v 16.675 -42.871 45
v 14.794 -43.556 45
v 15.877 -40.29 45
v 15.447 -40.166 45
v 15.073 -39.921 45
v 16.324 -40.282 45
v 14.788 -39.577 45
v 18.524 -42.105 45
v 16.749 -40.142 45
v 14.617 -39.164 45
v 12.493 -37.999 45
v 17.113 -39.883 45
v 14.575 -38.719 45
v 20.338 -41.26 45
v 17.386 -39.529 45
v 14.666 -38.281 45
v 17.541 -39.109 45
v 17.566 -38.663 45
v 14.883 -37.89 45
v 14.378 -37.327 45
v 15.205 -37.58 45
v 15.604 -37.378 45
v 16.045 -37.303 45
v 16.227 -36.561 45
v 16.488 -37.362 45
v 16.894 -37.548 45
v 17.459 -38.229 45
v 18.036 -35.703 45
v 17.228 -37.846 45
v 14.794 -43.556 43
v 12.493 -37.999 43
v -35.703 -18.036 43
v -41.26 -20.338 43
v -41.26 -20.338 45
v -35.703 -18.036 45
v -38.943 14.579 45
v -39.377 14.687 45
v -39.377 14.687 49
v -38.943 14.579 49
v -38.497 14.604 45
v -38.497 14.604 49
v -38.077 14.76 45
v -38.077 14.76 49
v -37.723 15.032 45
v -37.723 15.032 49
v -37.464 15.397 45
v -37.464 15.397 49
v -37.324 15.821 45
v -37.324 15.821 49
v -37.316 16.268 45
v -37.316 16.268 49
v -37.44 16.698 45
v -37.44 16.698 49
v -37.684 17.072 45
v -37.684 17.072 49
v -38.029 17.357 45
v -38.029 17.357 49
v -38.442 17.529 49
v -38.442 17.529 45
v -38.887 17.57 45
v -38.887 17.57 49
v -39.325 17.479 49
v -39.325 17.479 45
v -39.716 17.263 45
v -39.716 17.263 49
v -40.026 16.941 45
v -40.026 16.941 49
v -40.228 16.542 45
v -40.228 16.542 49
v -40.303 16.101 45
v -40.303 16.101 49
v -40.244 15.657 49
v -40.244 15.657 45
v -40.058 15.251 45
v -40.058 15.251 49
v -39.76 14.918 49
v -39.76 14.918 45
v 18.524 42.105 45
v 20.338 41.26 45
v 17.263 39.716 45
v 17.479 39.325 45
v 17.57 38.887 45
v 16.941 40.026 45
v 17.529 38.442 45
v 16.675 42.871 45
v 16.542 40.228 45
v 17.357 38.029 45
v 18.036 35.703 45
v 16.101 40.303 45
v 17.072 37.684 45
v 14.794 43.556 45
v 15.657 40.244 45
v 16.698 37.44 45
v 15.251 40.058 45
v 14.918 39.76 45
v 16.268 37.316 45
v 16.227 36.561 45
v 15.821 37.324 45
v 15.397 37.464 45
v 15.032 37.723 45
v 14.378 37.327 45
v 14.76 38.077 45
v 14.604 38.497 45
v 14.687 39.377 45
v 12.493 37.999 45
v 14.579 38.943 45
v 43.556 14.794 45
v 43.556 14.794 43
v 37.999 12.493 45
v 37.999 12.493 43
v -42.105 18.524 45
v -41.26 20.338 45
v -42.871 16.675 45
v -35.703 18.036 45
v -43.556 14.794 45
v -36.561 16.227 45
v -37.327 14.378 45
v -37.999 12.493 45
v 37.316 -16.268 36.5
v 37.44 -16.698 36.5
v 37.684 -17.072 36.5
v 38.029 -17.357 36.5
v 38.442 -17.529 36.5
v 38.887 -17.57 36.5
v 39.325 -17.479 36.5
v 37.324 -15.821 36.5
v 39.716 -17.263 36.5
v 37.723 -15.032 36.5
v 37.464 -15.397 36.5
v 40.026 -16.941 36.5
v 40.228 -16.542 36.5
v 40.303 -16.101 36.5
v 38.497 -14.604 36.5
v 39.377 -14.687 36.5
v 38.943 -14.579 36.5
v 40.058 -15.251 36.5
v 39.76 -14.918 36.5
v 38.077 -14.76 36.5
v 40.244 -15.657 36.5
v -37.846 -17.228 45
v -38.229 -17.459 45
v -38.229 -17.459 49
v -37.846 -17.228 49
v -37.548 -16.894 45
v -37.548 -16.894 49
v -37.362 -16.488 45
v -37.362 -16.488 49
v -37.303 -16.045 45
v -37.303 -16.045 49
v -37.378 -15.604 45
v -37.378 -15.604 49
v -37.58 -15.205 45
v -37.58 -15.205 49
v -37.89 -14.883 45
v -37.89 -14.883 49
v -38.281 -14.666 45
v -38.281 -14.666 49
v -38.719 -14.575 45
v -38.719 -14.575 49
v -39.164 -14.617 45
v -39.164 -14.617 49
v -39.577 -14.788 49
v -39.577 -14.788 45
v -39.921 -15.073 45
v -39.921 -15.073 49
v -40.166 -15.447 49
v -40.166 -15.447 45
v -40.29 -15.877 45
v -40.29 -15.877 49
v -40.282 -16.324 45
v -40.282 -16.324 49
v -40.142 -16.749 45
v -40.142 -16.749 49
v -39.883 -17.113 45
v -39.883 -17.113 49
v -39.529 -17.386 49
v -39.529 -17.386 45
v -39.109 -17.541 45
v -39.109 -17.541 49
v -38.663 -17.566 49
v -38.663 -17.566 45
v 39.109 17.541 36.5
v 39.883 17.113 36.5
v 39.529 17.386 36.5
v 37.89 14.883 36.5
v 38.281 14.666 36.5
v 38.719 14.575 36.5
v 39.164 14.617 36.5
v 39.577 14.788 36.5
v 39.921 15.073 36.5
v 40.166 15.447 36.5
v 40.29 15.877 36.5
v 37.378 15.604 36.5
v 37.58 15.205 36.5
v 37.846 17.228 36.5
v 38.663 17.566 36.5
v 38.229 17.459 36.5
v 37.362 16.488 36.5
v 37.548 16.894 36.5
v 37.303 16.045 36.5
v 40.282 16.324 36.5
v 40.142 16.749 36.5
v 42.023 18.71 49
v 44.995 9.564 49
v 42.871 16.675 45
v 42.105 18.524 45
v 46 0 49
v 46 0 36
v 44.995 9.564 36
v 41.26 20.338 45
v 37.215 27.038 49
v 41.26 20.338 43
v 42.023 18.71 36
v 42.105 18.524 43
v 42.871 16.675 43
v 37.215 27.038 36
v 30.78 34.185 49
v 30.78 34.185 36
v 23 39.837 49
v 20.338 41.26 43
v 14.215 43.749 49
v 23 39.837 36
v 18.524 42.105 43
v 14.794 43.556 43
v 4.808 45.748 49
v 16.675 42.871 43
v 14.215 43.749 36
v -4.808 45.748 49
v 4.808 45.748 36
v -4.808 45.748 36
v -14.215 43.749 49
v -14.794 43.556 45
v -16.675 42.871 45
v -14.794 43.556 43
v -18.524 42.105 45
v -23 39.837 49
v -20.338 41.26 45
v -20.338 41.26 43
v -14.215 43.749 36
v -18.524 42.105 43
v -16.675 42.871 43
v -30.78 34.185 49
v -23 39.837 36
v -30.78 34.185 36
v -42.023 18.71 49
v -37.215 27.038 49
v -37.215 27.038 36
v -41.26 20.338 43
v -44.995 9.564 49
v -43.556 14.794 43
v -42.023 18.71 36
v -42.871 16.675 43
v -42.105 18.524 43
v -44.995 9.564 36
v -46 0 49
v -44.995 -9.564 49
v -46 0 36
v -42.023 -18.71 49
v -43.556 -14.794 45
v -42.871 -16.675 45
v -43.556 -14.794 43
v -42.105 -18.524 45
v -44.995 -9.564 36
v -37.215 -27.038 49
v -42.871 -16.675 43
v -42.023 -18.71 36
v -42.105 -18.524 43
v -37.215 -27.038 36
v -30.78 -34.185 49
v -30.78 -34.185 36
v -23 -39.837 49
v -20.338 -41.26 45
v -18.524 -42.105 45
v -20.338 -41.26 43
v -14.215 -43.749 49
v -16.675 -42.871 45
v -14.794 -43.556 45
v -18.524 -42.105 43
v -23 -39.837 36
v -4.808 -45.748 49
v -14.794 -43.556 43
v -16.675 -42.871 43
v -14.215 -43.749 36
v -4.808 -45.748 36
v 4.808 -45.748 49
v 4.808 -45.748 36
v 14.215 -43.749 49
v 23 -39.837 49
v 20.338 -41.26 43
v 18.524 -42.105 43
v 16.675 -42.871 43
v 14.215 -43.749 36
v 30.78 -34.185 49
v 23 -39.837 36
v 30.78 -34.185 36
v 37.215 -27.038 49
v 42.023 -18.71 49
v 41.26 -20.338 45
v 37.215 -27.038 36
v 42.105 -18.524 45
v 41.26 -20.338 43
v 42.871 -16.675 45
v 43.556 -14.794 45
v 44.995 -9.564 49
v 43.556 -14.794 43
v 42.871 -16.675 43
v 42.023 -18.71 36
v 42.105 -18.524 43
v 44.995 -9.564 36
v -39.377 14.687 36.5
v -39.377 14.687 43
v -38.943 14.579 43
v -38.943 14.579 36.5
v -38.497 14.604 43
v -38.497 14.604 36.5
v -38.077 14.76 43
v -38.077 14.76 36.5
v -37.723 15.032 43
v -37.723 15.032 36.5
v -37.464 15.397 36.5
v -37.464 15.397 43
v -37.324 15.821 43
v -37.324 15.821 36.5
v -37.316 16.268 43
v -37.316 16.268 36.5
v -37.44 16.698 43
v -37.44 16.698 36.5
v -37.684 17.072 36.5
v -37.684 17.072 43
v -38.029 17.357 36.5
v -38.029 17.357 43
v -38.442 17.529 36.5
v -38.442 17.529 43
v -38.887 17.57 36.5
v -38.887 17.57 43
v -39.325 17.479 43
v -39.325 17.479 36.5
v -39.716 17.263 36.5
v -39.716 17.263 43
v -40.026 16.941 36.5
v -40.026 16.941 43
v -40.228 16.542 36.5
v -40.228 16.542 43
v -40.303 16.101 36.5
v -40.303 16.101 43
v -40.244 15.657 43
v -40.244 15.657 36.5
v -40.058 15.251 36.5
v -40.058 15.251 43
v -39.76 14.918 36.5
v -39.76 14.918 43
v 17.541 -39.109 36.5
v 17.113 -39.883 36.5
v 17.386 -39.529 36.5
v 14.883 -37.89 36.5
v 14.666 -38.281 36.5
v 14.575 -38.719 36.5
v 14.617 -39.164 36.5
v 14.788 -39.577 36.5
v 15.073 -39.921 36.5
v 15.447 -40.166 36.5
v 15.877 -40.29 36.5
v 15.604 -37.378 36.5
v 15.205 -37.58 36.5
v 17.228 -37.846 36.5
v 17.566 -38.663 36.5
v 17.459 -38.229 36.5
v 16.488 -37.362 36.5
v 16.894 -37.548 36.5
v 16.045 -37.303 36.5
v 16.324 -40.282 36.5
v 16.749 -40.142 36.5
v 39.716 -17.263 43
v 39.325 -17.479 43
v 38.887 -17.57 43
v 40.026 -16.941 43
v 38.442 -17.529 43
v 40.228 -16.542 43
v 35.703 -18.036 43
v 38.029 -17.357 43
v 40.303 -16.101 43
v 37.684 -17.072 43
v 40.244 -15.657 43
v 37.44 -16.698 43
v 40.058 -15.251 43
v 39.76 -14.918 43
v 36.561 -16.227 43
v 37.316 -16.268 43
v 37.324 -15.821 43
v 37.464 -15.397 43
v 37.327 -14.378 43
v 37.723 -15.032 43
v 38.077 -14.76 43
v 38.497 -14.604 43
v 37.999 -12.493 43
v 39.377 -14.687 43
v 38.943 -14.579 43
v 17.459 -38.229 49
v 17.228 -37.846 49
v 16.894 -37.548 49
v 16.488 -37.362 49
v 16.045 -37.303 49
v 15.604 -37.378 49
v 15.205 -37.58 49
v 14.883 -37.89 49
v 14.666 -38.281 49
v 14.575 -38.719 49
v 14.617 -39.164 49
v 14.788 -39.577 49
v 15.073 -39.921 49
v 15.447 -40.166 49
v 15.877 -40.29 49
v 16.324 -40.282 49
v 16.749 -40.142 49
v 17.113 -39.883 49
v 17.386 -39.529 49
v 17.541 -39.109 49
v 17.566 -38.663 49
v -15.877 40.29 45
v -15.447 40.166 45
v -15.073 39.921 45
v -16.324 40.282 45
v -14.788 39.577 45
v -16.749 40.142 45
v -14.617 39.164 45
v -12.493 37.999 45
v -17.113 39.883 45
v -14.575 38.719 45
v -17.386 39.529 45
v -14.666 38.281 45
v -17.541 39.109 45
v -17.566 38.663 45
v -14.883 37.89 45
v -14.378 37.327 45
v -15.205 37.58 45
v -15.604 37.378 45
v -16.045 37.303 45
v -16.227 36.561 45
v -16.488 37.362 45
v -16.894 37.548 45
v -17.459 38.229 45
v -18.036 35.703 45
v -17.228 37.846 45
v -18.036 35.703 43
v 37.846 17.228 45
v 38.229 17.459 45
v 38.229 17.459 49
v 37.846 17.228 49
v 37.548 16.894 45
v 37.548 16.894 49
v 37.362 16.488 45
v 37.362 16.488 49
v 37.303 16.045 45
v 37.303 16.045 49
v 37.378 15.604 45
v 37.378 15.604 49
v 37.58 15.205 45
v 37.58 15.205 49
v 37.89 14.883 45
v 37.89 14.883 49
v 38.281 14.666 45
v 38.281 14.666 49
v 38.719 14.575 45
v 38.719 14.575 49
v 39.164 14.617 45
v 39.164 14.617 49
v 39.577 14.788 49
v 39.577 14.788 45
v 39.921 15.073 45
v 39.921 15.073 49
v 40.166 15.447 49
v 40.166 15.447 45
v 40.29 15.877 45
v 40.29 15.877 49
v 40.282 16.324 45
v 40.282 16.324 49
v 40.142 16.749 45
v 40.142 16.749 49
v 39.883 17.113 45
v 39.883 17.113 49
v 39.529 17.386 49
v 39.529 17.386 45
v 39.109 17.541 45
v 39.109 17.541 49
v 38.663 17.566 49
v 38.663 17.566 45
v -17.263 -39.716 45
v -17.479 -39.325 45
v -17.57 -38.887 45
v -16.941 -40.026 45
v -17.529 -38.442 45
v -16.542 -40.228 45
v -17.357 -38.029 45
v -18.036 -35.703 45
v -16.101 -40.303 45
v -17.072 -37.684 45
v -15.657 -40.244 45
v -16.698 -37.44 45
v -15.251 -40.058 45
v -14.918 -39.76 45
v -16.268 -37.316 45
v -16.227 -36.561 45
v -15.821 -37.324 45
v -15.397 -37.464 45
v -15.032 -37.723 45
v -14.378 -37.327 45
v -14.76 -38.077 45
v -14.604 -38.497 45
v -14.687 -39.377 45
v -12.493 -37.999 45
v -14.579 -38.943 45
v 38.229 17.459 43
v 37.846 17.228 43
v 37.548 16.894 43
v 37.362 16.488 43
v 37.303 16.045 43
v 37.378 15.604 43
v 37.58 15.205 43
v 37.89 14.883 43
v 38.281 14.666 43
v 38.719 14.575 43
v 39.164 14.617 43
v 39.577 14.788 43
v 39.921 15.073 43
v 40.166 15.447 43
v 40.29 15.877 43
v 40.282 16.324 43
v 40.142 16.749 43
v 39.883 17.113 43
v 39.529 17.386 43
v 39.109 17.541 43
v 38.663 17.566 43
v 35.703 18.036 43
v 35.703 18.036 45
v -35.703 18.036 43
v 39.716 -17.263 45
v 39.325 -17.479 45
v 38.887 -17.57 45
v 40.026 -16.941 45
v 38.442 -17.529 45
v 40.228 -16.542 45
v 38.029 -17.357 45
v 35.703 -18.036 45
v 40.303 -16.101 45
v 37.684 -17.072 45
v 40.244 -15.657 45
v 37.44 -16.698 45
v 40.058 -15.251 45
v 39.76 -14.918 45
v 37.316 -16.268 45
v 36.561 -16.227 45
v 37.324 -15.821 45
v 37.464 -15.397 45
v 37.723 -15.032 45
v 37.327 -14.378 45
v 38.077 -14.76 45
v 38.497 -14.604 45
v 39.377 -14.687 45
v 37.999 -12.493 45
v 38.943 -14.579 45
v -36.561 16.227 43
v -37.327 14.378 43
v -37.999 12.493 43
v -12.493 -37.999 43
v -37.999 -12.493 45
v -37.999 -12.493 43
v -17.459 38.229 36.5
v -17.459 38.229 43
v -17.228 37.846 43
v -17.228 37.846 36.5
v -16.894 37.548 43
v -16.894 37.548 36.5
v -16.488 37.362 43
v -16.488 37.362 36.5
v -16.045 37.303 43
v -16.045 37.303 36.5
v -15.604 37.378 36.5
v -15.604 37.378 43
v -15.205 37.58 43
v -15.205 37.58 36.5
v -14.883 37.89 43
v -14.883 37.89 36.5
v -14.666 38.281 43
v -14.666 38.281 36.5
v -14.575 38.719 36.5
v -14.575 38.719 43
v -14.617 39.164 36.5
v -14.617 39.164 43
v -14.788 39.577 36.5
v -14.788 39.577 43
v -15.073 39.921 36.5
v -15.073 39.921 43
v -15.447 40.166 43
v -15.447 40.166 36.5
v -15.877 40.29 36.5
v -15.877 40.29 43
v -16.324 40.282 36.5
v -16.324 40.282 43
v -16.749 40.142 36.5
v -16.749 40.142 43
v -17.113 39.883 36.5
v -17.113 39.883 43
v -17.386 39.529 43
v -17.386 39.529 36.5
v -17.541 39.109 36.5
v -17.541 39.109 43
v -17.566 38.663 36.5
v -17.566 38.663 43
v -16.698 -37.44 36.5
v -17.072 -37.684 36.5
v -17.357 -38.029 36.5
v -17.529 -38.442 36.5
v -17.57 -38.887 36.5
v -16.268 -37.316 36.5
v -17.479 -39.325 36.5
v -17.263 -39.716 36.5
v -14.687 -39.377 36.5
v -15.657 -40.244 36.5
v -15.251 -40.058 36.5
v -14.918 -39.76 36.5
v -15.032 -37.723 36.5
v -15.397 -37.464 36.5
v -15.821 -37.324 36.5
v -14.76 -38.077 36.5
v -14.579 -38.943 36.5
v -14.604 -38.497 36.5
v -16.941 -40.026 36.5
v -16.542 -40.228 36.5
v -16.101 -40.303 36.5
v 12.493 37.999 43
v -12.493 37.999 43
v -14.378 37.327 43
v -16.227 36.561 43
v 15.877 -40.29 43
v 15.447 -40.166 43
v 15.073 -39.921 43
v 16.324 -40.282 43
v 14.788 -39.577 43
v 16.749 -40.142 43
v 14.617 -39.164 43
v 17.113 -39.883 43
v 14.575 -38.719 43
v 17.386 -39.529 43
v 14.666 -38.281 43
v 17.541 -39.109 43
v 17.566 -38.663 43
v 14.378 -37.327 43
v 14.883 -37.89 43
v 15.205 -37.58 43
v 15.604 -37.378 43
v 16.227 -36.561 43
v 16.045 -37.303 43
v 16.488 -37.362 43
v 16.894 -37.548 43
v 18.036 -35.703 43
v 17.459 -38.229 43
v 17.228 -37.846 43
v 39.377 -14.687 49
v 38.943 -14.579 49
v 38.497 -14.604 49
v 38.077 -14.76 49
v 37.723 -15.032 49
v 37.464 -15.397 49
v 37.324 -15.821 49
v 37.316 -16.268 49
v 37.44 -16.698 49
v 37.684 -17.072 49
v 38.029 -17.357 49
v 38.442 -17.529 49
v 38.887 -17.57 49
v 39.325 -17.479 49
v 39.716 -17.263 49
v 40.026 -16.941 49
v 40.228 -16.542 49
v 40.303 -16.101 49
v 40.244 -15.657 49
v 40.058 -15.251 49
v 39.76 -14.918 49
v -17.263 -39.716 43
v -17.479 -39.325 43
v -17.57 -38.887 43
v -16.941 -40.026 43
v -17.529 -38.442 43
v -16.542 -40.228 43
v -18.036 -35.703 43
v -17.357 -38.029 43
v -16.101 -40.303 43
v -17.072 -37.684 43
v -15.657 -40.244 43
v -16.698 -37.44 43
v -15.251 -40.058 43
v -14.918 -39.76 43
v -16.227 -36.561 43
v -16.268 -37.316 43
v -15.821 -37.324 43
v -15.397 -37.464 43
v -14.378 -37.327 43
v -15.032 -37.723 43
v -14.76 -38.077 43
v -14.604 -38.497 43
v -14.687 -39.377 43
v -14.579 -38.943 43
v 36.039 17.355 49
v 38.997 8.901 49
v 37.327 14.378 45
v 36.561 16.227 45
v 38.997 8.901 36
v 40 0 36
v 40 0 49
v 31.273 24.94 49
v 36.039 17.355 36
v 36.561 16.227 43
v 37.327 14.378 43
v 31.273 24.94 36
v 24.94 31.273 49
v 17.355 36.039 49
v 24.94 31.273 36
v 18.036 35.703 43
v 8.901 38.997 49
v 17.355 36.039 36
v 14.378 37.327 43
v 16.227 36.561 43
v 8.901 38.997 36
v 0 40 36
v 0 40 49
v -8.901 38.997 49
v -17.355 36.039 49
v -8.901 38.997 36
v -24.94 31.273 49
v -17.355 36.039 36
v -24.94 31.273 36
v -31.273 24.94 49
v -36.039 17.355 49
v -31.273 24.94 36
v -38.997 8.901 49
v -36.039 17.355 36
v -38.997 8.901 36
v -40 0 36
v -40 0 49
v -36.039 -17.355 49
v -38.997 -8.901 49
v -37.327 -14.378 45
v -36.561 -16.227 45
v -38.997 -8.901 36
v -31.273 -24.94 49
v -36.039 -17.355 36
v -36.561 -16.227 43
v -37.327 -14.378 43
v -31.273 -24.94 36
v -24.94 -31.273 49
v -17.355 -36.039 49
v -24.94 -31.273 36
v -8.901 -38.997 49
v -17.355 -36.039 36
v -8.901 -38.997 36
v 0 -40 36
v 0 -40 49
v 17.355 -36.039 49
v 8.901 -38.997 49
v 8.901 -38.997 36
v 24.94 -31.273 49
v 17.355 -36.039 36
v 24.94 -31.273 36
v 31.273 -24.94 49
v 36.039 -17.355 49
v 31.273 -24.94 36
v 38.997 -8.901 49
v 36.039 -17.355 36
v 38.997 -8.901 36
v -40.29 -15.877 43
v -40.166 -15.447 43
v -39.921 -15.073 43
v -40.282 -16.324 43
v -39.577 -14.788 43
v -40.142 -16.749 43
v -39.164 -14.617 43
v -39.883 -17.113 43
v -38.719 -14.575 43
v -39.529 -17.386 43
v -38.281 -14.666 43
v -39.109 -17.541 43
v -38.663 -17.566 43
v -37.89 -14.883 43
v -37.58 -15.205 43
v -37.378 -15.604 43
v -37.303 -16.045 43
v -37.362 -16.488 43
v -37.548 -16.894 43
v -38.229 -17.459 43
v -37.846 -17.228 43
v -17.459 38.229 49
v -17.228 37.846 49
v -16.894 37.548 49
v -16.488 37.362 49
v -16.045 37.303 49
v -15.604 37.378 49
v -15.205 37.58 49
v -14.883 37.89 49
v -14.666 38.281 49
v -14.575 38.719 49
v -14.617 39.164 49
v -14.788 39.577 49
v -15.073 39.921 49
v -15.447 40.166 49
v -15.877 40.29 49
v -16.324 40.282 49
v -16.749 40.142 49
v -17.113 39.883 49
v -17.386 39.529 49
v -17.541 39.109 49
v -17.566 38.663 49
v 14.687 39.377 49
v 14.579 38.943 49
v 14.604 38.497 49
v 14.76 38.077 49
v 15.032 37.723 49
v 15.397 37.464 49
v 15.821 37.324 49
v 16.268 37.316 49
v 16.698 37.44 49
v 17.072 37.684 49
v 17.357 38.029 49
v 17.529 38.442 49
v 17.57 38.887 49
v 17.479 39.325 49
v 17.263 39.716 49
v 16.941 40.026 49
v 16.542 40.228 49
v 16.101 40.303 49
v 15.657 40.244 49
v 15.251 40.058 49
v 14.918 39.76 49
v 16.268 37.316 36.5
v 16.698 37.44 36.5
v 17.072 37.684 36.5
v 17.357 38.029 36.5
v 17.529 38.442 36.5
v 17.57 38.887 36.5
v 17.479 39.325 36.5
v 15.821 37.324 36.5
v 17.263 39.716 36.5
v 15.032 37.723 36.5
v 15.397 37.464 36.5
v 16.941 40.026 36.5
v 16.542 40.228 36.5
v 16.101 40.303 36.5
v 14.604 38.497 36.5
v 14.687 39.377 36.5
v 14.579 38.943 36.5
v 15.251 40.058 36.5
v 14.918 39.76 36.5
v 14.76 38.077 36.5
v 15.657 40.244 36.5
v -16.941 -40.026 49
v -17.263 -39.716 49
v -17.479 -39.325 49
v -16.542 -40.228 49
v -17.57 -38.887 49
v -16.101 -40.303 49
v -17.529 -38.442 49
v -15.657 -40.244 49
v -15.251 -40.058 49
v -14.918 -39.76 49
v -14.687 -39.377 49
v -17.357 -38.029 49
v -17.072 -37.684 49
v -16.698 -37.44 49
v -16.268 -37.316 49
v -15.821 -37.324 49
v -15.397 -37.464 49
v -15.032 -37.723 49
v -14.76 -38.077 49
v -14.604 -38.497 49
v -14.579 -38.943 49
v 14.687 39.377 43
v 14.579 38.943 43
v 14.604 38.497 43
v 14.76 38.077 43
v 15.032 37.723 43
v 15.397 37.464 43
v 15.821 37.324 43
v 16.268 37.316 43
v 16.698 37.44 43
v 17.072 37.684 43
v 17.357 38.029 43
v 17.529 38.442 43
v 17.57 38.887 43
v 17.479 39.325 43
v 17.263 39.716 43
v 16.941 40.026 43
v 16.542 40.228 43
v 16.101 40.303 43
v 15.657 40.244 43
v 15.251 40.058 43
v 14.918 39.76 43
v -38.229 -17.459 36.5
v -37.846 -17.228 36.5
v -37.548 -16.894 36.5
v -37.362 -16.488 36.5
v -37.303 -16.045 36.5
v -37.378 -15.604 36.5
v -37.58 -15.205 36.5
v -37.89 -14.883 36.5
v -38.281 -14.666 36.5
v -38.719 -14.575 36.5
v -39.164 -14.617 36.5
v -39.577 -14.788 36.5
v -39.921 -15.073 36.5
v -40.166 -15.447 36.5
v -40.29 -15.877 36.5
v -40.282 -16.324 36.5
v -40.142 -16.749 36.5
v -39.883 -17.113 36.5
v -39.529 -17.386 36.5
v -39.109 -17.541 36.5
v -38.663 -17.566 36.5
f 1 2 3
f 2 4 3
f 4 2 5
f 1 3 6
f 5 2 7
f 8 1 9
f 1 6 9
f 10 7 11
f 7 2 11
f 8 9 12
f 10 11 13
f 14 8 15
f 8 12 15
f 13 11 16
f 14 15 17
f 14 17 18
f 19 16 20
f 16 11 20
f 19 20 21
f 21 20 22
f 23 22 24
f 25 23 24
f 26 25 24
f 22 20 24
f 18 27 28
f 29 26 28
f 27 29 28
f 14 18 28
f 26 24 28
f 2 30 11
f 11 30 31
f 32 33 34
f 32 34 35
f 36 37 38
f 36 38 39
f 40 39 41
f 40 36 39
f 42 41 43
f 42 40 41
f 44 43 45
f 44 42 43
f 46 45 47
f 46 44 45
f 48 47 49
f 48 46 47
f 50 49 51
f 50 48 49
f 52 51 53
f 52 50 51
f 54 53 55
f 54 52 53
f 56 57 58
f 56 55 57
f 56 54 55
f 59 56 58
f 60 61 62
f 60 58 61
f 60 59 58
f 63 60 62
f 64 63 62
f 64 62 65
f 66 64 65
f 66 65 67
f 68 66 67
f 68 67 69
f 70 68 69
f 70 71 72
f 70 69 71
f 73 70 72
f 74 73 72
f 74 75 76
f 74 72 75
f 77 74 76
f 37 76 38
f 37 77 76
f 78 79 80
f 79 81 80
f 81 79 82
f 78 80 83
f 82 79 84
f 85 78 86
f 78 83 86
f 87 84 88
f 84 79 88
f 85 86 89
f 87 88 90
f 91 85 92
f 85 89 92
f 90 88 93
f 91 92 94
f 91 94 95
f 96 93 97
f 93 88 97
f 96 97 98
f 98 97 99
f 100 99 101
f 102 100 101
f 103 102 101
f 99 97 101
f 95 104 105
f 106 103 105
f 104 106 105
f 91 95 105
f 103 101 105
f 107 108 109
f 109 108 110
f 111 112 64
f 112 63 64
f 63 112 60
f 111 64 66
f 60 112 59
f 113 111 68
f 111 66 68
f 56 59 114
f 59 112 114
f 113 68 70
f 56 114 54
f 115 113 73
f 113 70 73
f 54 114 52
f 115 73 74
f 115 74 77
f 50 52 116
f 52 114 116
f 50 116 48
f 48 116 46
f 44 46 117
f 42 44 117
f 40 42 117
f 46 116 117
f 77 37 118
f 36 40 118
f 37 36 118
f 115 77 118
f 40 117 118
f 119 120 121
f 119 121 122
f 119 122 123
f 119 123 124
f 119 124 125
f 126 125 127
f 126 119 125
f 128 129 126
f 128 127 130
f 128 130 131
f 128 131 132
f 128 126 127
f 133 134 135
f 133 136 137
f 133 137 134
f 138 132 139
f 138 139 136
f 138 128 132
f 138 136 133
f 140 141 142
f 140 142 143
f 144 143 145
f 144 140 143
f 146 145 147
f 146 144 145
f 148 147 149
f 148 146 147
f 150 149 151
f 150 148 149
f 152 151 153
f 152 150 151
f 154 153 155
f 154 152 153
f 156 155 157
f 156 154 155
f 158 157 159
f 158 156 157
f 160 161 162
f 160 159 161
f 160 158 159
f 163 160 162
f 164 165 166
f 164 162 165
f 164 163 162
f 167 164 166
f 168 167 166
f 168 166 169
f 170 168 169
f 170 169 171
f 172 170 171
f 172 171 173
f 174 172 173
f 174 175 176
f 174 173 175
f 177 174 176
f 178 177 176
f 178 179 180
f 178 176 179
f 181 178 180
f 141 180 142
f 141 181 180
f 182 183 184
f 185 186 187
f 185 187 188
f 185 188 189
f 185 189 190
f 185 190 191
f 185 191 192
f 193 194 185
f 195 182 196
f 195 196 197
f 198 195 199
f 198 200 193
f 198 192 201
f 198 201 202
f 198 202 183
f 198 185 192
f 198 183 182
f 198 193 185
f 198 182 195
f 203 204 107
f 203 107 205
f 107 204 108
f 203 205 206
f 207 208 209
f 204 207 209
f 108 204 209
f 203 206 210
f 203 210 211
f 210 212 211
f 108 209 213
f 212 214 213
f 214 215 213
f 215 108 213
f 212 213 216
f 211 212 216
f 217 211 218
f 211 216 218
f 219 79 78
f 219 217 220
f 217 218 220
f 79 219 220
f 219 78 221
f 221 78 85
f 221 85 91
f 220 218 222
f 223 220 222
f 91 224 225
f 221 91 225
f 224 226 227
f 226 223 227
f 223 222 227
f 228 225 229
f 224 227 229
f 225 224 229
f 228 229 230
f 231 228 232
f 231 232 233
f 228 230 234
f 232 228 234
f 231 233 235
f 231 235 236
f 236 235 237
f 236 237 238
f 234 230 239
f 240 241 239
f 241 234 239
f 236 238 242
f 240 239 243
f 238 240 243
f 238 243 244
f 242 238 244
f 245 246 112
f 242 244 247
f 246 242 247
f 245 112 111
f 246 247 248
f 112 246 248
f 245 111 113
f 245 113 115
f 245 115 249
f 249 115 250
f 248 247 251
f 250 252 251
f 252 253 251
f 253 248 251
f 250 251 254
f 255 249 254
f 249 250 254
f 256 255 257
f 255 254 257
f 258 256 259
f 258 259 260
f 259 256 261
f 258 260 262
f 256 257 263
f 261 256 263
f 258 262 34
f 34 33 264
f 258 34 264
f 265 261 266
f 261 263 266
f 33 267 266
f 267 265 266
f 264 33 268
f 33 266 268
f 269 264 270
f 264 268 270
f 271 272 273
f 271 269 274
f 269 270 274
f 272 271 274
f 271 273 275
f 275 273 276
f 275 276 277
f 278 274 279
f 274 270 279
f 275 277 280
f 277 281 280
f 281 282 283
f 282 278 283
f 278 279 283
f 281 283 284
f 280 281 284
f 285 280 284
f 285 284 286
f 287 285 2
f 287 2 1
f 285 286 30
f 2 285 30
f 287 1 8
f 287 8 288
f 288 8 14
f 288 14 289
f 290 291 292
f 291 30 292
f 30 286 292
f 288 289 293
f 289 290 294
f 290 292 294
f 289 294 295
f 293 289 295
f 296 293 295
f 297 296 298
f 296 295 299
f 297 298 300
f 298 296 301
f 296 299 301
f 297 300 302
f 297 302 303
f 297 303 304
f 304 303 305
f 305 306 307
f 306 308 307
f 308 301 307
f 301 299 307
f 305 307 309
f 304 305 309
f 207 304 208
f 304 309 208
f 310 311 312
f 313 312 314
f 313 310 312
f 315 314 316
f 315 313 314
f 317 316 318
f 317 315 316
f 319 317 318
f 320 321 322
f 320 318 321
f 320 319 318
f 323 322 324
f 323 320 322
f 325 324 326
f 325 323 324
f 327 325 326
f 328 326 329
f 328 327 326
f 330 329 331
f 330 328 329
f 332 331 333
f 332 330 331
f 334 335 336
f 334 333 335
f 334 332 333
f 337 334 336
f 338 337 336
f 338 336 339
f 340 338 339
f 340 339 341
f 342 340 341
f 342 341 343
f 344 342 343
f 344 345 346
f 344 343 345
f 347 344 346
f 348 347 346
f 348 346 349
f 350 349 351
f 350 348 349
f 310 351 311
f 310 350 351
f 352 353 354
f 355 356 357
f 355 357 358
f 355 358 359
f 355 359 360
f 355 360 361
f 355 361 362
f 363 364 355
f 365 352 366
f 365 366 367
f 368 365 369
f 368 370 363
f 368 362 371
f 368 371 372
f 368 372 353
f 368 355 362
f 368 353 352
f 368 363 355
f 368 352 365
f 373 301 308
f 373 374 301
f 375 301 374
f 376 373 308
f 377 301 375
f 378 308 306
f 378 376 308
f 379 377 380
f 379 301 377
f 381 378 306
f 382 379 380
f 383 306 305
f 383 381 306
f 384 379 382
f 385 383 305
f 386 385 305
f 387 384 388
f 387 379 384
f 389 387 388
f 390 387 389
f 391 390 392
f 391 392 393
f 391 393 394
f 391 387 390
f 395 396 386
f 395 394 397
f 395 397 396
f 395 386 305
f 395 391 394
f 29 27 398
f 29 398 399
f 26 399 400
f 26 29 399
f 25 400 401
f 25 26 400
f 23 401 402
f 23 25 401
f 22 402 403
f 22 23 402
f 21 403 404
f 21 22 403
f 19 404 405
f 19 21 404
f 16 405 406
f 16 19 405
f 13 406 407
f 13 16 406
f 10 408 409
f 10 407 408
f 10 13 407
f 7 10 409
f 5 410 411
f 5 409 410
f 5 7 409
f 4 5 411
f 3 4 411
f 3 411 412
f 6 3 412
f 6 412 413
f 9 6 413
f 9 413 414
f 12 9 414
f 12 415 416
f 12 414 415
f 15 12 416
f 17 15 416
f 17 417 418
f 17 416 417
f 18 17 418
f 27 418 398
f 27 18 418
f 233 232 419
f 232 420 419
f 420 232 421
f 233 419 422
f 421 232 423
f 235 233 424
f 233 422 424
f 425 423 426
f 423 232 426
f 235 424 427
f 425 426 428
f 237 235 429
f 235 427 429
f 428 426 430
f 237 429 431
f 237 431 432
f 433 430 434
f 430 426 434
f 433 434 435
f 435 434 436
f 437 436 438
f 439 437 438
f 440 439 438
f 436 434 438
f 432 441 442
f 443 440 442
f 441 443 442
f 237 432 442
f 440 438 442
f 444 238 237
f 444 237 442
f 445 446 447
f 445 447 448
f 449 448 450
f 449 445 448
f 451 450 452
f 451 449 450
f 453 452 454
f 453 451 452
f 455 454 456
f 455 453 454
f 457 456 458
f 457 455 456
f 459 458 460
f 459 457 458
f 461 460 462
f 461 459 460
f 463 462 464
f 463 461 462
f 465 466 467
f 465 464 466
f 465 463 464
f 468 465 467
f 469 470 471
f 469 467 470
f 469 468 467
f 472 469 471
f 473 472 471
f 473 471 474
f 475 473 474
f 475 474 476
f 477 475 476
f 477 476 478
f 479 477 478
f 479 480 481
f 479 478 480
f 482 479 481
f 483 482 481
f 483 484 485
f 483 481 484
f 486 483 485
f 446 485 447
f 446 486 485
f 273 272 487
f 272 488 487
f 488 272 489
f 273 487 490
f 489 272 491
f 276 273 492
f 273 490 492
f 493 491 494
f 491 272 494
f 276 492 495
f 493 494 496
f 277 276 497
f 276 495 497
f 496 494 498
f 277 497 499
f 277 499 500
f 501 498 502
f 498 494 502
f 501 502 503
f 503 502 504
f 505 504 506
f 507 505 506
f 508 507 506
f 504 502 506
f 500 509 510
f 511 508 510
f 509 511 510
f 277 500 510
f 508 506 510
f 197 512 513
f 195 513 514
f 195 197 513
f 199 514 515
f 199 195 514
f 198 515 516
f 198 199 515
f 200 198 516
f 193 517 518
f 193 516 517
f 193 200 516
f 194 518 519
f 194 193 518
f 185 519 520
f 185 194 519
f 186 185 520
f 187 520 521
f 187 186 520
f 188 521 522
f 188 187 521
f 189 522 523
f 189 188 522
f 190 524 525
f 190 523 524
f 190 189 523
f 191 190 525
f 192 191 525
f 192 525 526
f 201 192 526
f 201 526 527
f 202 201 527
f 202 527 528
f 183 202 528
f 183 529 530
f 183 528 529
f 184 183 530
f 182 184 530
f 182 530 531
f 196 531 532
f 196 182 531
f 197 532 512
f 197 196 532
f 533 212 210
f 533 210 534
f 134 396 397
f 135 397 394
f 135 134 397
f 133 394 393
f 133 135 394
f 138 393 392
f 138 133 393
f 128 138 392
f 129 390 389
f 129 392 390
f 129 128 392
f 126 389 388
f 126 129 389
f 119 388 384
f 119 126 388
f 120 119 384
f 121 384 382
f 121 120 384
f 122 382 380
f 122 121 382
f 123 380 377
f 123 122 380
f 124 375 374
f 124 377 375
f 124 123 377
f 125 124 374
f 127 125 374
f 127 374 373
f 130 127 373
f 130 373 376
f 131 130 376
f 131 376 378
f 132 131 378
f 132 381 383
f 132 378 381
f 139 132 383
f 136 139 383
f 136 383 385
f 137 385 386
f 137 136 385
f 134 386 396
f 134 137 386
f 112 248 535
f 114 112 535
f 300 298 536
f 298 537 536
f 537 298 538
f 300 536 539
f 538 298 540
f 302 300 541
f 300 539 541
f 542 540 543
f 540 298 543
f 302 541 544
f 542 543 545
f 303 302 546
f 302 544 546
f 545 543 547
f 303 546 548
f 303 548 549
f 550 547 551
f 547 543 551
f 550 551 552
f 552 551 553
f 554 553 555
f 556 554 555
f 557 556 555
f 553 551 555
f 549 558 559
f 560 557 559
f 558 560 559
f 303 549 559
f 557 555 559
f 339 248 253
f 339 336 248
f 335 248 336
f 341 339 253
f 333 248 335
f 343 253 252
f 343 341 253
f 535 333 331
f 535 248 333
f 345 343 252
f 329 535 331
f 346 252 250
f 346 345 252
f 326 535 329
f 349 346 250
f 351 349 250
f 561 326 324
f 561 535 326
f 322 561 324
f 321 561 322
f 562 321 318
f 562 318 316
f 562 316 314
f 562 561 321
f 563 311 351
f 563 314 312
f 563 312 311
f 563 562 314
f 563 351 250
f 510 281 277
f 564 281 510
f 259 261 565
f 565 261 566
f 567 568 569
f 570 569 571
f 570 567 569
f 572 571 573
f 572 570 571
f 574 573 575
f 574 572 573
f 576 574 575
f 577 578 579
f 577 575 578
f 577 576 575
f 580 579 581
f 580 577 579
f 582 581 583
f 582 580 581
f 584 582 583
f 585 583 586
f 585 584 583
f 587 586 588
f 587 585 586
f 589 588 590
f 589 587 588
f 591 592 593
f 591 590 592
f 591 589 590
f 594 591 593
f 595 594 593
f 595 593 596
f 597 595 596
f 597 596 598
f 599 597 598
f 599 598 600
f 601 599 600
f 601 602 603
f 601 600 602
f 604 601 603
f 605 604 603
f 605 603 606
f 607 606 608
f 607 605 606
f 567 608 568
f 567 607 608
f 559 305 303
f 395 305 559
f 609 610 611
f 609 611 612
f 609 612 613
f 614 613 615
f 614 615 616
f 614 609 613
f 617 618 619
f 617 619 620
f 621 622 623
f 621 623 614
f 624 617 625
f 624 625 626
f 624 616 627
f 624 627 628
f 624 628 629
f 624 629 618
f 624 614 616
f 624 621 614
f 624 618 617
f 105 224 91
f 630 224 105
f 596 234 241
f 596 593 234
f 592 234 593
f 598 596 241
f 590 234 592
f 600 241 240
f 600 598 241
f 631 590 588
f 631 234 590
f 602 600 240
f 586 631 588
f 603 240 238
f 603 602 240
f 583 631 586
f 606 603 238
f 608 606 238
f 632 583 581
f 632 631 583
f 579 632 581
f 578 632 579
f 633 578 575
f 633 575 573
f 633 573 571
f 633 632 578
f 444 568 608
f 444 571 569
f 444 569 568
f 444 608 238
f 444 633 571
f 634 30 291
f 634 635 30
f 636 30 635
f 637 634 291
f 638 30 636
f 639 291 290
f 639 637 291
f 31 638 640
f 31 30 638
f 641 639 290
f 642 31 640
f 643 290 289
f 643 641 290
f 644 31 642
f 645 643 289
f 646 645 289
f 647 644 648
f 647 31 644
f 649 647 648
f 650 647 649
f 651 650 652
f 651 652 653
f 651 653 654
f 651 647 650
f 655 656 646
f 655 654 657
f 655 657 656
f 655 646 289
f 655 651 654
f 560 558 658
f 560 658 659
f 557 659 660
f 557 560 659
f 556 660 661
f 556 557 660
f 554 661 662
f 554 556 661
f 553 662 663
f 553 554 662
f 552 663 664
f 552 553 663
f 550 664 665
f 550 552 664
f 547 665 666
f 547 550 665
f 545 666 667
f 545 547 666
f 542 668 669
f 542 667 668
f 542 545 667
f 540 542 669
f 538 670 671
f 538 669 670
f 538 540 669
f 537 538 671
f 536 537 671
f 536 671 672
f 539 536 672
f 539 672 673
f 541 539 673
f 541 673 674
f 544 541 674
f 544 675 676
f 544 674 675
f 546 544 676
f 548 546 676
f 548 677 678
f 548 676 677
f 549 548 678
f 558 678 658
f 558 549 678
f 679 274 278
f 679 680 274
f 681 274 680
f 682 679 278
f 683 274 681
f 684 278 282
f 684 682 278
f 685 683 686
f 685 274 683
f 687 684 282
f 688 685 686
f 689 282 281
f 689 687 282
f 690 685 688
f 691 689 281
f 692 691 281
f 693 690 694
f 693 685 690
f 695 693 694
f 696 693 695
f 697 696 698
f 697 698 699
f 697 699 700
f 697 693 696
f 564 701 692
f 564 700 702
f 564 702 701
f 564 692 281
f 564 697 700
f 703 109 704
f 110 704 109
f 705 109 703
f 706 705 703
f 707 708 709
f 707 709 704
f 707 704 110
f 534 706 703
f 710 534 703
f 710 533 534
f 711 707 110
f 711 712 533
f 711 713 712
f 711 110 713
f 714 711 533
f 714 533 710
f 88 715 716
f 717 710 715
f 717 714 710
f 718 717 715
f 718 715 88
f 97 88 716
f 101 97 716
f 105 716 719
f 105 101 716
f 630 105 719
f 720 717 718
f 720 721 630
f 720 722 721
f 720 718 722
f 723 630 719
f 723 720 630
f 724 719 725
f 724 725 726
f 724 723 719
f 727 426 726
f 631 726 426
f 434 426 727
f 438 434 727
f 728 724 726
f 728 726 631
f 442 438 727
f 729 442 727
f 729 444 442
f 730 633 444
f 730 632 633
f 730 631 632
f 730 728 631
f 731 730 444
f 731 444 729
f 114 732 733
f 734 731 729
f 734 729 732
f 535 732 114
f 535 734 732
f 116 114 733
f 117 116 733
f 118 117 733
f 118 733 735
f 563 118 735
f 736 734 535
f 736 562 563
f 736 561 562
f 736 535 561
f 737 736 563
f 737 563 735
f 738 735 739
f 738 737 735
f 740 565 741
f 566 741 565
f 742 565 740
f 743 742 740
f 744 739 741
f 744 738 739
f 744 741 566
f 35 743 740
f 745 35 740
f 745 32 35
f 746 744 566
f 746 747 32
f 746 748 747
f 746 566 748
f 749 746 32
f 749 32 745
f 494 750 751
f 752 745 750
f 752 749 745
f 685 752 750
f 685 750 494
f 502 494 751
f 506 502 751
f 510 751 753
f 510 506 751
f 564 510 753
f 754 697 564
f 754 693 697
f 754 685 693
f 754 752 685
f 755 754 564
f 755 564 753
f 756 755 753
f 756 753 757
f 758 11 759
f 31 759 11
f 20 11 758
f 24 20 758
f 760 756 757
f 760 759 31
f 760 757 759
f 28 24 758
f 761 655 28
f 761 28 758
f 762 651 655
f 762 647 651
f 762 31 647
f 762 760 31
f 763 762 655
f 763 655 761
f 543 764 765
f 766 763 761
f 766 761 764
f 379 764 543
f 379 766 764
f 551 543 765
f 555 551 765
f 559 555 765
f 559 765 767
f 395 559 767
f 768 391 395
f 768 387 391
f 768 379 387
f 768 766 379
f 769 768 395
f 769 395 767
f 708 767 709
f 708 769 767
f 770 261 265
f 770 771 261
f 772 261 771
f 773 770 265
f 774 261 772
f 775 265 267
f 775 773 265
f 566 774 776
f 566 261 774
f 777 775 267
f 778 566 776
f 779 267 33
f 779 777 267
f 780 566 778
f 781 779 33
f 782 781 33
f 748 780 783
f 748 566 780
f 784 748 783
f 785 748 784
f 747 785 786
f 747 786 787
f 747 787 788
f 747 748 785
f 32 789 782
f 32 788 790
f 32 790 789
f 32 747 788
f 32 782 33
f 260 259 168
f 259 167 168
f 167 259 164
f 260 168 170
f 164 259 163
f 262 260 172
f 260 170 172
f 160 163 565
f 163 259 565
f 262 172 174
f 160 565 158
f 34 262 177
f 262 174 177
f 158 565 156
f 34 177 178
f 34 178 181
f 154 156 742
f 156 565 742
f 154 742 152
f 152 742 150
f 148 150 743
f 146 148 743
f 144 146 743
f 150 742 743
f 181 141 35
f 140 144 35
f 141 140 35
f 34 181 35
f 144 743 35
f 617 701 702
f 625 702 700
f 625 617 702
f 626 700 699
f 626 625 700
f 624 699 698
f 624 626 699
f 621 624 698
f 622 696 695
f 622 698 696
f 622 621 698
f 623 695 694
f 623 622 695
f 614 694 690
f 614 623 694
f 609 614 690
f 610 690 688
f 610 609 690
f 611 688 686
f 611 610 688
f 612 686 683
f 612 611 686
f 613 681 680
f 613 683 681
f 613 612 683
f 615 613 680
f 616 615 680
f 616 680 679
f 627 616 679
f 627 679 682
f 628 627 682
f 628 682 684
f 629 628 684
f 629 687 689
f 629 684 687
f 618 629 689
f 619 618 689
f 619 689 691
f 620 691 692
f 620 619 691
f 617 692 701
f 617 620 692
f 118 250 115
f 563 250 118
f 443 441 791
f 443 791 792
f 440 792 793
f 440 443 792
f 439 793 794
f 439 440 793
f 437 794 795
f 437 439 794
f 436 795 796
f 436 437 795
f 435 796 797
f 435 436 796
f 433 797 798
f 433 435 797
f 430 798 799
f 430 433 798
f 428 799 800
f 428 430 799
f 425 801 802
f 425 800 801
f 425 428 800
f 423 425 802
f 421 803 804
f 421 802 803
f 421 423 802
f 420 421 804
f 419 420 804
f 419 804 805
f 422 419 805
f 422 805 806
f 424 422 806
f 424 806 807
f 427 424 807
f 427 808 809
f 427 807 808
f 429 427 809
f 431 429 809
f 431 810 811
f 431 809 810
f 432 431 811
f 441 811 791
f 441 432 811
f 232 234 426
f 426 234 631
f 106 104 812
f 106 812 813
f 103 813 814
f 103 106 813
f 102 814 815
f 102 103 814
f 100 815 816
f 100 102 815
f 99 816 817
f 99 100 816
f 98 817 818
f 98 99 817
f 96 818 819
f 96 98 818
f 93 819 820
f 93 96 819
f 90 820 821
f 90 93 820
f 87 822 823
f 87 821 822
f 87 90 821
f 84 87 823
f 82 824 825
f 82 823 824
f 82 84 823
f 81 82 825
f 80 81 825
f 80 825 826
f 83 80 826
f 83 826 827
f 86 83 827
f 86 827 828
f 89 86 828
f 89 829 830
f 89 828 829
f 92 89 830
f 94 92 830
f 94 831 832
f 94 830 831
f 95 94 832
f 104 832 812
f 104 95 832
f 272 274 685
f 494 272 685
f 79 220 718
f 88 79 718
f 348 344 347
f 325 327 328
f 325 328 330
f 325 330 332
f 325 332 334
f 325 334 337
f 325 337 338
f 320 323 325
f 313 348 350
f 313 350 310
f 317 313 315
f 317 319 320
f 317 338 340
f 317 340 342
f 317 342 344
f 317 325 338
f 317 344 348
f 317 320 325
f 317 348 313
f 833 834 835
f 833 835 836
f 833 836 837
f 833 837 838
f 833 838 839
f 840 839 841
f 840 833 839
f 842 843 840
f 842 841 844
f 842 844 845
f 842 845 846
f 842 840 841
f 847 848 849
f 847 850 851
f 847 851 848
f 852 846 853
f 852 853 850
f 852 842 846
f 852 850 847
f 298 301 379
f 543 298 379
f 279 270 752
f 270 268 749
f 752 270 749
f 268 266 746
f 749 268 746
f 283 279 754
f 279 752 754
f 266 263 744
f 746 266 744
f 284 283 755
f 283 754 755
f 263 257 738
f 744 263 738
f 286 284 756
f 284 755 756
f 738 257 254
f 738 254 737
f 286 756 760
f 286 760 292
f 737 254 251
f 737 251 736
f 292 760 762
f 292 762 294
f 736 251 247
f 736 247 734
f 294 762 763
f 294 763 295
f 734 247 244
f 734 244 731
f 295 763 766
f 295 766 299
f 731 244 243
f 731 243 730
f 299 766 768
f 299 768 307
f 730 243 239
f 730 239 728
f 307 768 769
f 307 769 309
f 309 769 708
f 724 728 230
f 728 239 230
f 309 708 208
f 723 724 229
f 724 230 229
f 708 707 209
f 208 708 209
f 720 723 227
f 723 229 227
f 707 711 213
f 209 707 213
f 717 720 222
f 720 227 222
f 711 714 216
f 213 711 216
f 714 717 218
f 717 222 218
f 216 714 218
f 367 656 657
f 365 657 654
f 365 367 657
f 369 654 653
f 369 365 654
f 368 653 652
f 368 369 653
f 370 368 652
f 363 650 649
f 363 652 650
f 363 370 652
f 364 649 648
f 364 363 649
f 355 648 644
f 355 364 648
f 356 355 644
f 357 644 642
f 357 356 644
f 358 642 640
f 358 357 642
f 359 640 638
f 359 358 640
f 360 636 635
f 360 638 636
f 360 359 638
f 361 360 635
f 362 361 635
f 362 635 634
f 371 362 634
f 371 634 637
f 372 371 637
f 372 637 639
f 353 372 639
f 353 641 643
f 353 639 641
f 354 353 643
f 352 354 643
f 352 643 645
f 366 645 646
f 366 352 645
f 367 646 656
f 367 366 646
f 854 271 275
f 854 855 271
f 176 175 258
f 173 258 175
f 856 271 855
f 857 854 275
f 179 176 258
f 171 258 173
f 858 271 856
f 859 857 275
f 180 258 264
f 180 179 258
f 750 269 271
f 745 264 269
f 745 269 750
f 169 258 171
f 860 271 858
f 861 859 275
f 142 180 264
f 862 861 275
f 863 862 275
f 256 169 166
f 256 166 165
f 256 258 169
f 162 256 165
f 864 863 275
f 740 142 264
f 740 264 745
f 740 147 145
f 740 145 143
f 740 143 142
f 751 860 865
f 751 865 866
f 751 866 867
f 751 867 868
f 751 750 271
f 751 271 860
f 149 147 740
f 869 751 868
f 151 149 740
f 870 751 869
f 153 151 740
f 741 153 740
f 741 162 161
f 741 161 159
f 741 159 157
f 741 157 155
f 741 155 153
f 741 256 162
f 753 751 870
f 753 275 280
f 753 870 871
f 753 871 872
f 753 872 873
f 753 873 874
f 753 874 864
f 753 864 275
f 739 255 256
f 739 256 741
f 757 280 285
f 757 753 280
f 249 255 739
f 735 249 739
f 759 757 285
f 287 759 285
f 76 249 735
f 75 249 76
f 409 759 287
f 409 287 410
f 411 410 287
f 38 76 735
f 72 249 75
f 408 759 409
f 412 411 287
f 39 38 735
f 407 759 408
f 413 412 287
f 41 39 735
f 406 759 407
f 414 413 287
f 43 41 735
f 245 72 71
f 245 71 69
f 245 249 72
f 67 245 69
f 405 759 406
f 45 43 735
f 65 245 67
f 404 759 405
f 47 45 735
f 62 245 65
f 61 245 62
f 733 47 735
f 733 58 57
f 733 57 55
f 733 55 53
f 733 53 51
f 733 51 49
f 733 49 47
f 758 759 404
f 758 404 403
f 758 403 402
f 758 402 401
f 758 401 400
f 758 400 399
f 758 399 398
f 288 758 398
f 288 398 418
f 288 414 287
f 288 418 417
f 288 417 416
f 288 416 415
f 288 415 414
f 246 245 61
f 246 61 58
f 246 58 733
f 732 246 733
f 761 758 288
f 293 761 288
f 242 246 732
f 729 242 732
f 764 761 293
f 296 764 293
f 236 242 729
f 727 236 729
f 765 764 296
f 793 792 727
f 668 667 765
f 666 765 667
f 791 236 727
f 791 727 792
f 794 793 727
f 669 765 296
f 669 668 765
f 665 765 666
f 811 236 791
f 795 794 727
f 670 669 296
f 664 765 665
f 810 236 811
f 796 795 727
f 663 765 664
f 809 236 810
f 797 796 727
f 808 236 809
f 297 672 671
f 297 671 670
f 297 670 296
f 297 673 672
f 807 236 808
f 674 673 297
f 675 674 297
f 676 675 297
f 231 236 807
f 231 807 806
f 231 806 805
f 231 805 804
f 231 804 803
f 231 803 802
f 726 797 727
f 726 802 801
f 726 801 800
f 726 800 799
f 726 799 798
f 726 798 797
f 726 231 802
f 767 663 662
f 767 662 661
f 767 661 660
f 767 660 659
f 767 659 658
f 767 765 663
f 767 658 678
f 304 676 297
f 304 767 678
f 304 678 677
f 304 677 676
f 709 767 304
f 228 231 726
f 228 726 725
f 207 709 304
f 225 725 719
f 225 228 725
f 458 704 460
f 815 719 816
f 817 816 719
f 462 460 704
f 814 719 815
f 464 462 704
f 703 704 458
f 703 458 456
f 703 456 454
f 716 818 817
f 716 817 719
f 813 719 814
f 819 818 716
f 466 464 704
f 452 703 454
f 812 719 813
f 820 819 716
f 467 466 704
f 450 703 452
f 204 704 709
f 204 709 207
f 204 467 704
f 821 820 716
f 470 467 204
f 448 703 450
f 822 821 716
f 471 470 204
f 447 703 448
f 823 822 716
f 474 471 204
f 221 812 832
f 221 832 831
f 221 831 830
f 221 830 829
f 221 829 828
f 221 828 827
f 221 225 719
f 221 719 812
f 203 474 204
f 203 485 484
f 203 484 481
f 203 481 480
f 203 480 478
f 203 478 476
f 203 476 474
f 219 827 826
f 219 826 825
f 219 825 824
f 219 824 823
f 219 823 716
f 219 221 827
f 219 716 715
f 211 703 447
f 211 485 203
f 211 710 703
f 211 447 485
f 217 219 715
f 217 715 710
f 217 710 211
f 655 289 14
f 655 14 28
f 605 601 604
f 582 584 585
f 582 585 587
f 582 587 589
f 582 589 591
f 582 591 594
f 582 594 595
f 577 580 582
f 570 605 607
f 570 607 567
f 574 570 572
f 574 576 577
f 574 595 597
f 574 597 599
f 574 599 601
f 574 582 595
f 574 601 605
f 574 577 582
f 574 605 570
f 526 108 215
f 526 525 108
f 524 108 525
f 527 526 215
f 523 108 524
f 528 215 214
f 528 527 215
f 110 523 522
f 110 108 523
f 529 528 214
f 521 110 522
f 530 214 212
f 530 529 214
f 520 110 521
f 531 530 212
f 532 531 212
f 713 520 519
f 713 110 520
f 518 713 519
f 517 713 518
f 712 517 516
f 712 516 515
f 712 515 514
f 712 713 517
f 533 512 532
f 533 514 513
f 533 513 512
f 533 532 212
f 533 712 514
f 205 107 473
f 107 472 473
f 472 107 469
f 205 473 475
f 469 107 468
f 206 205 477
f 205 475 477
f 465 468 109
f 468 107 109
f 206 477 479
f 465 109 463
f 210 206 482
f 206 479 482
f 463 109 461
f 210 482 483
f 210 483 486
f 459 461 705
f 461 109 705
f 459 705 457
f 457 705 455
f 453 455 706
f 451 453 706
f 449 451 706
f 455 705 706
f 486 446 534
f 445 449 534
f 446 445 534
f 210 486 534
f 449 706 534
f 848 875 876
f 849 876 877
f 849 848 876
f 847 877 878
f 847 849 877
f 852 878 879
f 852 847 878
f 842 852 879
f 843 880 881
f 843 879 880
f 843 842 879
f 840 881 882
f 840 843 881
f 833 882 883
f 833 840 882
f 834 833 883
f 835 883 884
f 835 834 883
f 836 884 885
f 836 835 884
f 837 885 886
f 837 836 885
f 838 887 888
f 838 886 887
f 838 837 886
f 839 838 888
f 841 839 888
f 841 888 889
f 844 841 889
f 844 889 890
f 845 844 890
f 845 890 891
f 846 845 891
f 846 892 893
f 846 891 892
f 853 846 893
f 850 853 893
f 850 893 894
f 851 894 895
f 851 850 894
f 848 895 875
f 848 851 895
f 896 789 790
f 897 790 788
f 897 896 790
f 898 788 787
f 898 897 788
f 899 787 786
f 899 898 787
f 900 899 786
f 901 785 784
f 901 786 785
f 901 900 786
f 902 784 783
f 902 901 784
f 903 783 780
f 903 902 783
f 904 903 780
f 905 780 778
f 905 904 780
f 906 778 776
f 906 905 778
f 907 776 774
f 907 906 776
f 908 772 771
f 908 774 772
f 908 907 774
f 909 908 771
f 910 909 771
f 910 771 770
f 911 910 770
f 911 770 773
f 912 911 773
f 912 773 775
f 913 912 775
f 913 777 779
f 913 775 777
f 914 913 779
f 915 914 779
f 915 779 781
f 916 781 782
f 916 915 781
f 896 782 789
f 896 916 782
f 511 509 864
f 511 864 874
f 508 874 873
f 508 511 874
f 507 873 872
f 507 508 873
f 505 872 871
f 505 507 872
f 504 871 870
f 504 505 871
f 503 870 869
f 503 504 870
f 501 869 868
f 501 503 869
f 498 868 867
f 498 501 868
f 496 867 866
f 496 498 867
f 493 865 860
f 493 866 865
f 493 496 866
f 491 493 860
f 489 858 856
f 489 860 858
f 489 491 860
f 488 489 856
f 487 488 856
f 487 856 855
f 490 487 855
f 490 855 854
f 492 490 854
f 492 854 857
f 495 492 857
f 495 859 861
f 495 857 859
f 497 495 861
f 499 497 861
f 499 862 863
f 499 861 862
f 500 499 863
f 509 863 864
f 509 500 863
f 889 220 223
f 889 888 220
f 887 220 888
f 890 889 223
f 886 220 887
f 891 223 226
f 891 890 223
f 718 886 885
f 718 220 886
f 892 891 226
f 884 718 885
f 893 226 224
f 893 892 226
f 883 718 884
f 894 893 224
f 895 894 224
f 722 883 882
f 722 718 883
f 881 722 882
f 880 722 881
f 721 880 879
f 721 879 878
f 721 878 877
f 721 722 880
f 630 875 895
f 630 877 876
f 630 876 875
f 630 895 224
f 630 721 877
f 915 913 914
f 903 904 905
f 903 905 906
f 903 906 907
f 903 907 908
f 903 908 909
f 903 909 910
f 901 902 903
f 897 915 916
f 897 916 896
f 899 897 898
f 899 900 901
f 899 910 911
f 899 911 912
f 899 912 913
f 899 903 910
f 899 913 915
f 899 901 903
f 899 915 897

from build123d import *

# Parameters (mm, degrees)
BOX548_W                     = 6
BOX548_H                     = 8
BOX548_DEPTH                 = 2
BOX548_PLACEMENT_ANGLE       = 45
BOX546_W                     = 6
BOX546_H                     = 8
BOX546_DEPTH                 = 2
BOX545_W                     = 6
BOX545_H                     = 8
BOX545_DEPTH                 = 2
BOX549_W                     = 6
BOX549_H                     = 8
BOX549_DEPTH                 = 2
BOX549_PLACEMENT_ANGLE       = 135
BOX550_W                     = 6
BOX550_H                     = 8
BOX550_DEPTH                 = 2
BOX547_W                     = 6
BOX547_H                     = 8
BOX547_DEPTH                 = 2
BOX547_PLACEMENT_ANGLE       = 225
BOX551_W                     = 6
BOX551_H                     = 8
BOX551_DEPTH                 = 2
BOX544_W                     = 6
BOX544_H                     = 8
BOX544_DEPTH                 = 2
BOX544_PLACEMENT_ANGLE       = 45
COMPOUND925_PLACEMENT_ANGLE  = 22.5
CYLINDER1290_R               = 1.5
CYLINDER1290_DEPTH           = 32
CYLINDER1290_PLACEMENT_ANGLE = 45
CYLINDER1293_R               = 1.5
CYLINDER1293_DEPTH           = 32
CYLINDER1291_R               = 1.5
CYLINDER1291_DEPTH           = 32
CYLINDER1291_PLACEMENT_ANGLE = 135
CYLINDER1289_R               = 1.5
CYLINDER1289_DEPTH           = 32
CYLINDER1287_R               = 1.5
CYLINDER1287_DEPTH           = 32
CYLINDER1287_PLACEMENT_ANGLE = 225
CYLINDER1292_R               = 1.5
CYLINDER1292_DEPTH           = 32
CYLINDER1286_R               = 1.5
CYLINDER1286_DEPTH           = 32
CYLINDER1286_PLACEMENT_ANGLE = 45
CYLINDER1288_R               = 1.5
CYLINDER1288_DEPTH           = 32
COMPOUND926_PLACEMENT_ANGLE  = 22.5
TUBE115_R                    = 50
TUBE115_R_2                  = 40
TUBE115_DEPTH                = 12
TUBE113_R                    = 46
TUBE113_R_2                  = 40
TUBE113_DEPTH                = 24


with BuildPart() as krychle548:
    # Box548 → Box548 (new body)
    with BuildSketch(Plane.XY):
        with Locations((3, 4)):
            Rectangle(BOX548_W, BOX548_H)
    extrude(amount=BOX548_DEPTH)


with BuildPart() as krychle548_1:
    # Box548 placement: moved
    add(krychle548.part.moved(Location((30.405592, -34.648232, 33))).rotate(Axis((30.405592, -34.648232, 33), (0, 0, 1)), BOX548_PLACEMENT_ANGLE))


with BuildPart() as krychle546:
    # Box546 → Box546 (new body)
    with BuildSketch(Plane(origin=(46, -3, 33), x_dir=(0, 1, 0), z_dir=(0, 0, 1))):
        with Locations((3, 4)):
            Rectangle(BOX546_W, BOX546_H)
    extrude(amount=BOX546_DEPTH)


with BuildPart() as krychle545:
    # Box545 → Box545 (new body)
    with BuildSketch(Plane(origin=(-3, -46, 33), x_dir=(1, 0, 0), z_dir=(0, 0, 1))):
        with Locations((3, 4)):
            Rectangle(BOX545_W, BOX545_H)
    extrude(amount=BOX545_DEPTH)


with BuildPart() as krychle549:
    # Box549 → Box549 (new body)
    with BuildSketch(Plane.XY):
        with Locations((3, 4)):
            Rectangle(BOX549_W, BOX549_H)
    extrude(amount=BOX549_DEPTH)


with BuildPart() as krychle549_1:
    # Box549 placement: moved
    add(krychle549.part.moved(Location((34.648232, 30.405592, 33))).rotate(Axis((34.648232, 30.405592, 33), (0, 0, 1)), BOX549_PLACEMENT_ANGLE))


with BuildPart() as krychle550:
    # Box550 → Box550 (new body)
    with BuildSketch(Plane(origin=(3, 46, 33), x_dir=(-1, 0, 0), z_dir=(0, 0, 1))):
        with Locations((3, 4)):
            Rectangle(BOX550_W, BOX550_H)
    extrude(amount=BOX550_DEPTH)


with BuildPart() as krychle547:
    # Box547 → Box547 (new body)
    with BuildSketch(Plane.XY):
        with Locations((3, 4)):
            Rectangle(BOX547_W, BOX547_H)
    extrude(amount=BOX547_DEPTH)


with BuildPart() as krychle547_1:
    # Box547 placement: moved
    add(krychle547.part.moved(Location((-30.405592, 34.648232, 33))).rotate(Axis((-30.405592, 34.648232, 33), (0, 0, 1)), BOX547_PLACEMENT_ANGLE))


with BuildPart() as krychle551:
    # Box551 → Box551 (new body)
    with BuildSketch(Plane(origin=(-46, 3, 33), x_dir=(0, -1, 0), z_dir=(0, 0, 1))):
        with Locations((3, 4)):
            Rectangle(BOX551_W, BOX551_H)
    extrude(amount=BOX551_DEPTH)


with BuildPart() as compound925:
    # Box544 → Box544 (new body)
    with BuildSketch(Plane.XY):
        with Locations((3, 4)):
            Rectangle(BOX544_W, BOX544_H)
    extrude(amount=BOX544_DEPTH)


with BuildPart() as compound925_1:
    # Box544 placement: moved
    add(compound925.part.moved(Location((-34.648232, -30.405592, 33))).rotate(Axis((-34.648232, -30.405592, 33), (0, 0, -1)), BOX544_PLACEMENT_ANGLE))

    # Compound925: union Krychle548, Krychle546, Krychle545, Krychle549, Krychle550, Krychle547, Krychle551
    add(krychle548_1.part)
    add(krychle546.part)
    add(krychle545.part)
    add(krychle549_1.part)
    add(krychle550.part)
    add(krychle547_1.part)
    add(krychle551.part)


with BuildPart() as compound925_2:
    # Compound925 placement: moved
    add(compound925_1.part.moved(Location((0, 0, 10))).rotate(Axis((0, 0, 10), (0, 0, 1)), COMPOUND925_PLACEMENT_ANGLE))


with BuildPart() as v_lec1290:
    # Cylinder1290 → Cylinder1290 (new body)
    with BuildSketch(Plane.XY):
        Circle(CYLINDER1290_R)
    extrude(amount=CYLINDER1290_DEPTH)


with BuildPart() as v_lec1290_1:
    # Cylinder1290 placement: moved
    add(v_lec1290.part.moved(Location((29.698485, -29.698485, 33.5))).rotate(Axis((29.698485, -29.698485, 33.5), (0, 0, 1)), CYLINDER1290_PLACEMENT_ANGLE))


with BuildPart() as v_lec1293:
    # Cylinder1293 → Cylinder1293 (new body)
    with BuildSketch(Plane(origin=(42, 0, 33.5), x_dir=(0, 1, 0), z_dir=(0, 0, 1))):
        Circle(CYLINDER1293_R)
    extrude(amount=CYLINDER1293_DEPTH)


with BuildPart() as v_lec1291:
    # Cylinder1291 → Cylinder1291 (new body)
    with BuildSketch(Plane.XY):
        Circle(CYLINDER1291_R)
    extrude(amount=CYLINDER1291_DEPTH)


with BuildPart() as v_lec1291_1:
    # Cylinder1291 placement: moved
    add(v_lec1291.part.moved(Location((29.698485, 29.698485, 33.5))).rotate(Axis((29.698485, 29.698485, 33.5), (0, 0, 1)), CYLINDER1291_PLACEMENT_ANGLE))


with BuildPart() as v_lec1289:
    # Cylinder1289 → Cylinder1289 (new body)
    with BuildSketch(Plane(origin=(0, 42, 33.5), x_dir=(-1, 0, 0), z_dir=(0, 0, 1))):
        Circle(CYLINDER1289_R)
    extrude(amount=CYLINDER1289_DEPTH)


with BuildPart() as v_lec1287:
    # Cylinder1287 → Cylinder1287 (new body)
    with BuildSketch(Plane.XY):
        Circle(CYLINDER1287_R)
    extrude(amount=CYLINDER1287_DEPTH)


with BuildPart() as v_lec1287_1:
    # Cylinder1287 placement: moved
    add(v_lec1287.part.moved(Location((-29.698485, 29.698485, 33.5))).rotate(Axis((-29.698485, 29.698485, 33.5), (0, 0, 1)), CYLINDER1287_PLACEMENT_ANGLE))


with BuildPart() as v_lec1292:
    # Cylinder1292 → Cylinder1292 (new body)
    with BuildSketch(Plane(origin=(-42, 0, 33.5), x_dir=(0, -1, 0), z_dir=(0, 0, 1))):
        Circle(CYLINDER1292_R)
    extrude(amount=CYLINDER1292_DEPTH)


with BuildPart() as v_lec1286:
    # Cylinder1286 → Cylinder1286 (new body)
    with BuildSketch(Plane.XY):
        Circle(CYLINDER1286_R)
    extrude(amount=CYLINDER1286_DEPTH)


with BuildPart() as v_lec1286_1:
    # Cylinder1286 placement: moved
    add(v_lec1286.part.moved(Location((-29.698485, -29.698485, 33.5))).rotate(Axis((-29.698485, -29.698485, 33.5), (0, 0, -1)), CYLINDER1286_PLACEMENT_ANGLE))


with BuildPart() as compound926:
    # Cylinder1288 → Cylinder1288 (new body)
    with BuildSketch(Plane(origin=(0, -42, 33.5), x_dir=(1, 0, 0), z_dir=(0, 0, 1))):
        Circle(CYLINDER1288_R)
    extrude(amount=CYLINDER1288_DEPTH)

    # Compound926: union Válec1290, Válec1293, Válec1291, Válec1289, Válec1287, Válec1292, Válec1286
    add(v_lec1290_1.part)
    add(v_lec1293.part)
    add(v_lec1291_1.part)
    add(v_lec1289.part)
    add(v_lec1287_1.part)
    add(v_lec1292.part)
    add(v_lec1286_1.part)


with BuildPart() as compound926_1:
    # Compound926 placement: moved
    add(compound926.part.moved(Location((0, 0, 3))).rotate(Axis((0, 0, 3), (0, 0, 1)), COMPOUND926_PLACEMENT_ANGLE))


with BuildPart() as tube115:
    # Tube115 → Tube115 (new body)
    with BuildSketch(Plane.XY.offset(24)):
        Circle(TUBE115_R)
        Circle(TUBE115_R_2, mode=Mode.SUBTRACT)
    extrude(amount=TUBE115_DEPTH)


with BuildPart() as cut476:
    # Tube113 → Tube113 (new body)
    with BuildSketch(Plane.XY.offset(25)):
        Circle(TUBE113_R)
        Circle(TUBE113_R_2, mode=Mode.SUBTRACT)
    extrude(amount=TUBE113_DEPTH)

    # Cut473: cut Tube115
    add(tube115.part, mode=Mode.SUBTRACT)

    # Cut475: cut Compound926
    add(compound926_1.part, mode=Mode.SUBTRACT)

    # Cut476: cut Compound925
    add(compound925_2.part, mode=Mode.SUBTRACT)


solid = cut476.part
